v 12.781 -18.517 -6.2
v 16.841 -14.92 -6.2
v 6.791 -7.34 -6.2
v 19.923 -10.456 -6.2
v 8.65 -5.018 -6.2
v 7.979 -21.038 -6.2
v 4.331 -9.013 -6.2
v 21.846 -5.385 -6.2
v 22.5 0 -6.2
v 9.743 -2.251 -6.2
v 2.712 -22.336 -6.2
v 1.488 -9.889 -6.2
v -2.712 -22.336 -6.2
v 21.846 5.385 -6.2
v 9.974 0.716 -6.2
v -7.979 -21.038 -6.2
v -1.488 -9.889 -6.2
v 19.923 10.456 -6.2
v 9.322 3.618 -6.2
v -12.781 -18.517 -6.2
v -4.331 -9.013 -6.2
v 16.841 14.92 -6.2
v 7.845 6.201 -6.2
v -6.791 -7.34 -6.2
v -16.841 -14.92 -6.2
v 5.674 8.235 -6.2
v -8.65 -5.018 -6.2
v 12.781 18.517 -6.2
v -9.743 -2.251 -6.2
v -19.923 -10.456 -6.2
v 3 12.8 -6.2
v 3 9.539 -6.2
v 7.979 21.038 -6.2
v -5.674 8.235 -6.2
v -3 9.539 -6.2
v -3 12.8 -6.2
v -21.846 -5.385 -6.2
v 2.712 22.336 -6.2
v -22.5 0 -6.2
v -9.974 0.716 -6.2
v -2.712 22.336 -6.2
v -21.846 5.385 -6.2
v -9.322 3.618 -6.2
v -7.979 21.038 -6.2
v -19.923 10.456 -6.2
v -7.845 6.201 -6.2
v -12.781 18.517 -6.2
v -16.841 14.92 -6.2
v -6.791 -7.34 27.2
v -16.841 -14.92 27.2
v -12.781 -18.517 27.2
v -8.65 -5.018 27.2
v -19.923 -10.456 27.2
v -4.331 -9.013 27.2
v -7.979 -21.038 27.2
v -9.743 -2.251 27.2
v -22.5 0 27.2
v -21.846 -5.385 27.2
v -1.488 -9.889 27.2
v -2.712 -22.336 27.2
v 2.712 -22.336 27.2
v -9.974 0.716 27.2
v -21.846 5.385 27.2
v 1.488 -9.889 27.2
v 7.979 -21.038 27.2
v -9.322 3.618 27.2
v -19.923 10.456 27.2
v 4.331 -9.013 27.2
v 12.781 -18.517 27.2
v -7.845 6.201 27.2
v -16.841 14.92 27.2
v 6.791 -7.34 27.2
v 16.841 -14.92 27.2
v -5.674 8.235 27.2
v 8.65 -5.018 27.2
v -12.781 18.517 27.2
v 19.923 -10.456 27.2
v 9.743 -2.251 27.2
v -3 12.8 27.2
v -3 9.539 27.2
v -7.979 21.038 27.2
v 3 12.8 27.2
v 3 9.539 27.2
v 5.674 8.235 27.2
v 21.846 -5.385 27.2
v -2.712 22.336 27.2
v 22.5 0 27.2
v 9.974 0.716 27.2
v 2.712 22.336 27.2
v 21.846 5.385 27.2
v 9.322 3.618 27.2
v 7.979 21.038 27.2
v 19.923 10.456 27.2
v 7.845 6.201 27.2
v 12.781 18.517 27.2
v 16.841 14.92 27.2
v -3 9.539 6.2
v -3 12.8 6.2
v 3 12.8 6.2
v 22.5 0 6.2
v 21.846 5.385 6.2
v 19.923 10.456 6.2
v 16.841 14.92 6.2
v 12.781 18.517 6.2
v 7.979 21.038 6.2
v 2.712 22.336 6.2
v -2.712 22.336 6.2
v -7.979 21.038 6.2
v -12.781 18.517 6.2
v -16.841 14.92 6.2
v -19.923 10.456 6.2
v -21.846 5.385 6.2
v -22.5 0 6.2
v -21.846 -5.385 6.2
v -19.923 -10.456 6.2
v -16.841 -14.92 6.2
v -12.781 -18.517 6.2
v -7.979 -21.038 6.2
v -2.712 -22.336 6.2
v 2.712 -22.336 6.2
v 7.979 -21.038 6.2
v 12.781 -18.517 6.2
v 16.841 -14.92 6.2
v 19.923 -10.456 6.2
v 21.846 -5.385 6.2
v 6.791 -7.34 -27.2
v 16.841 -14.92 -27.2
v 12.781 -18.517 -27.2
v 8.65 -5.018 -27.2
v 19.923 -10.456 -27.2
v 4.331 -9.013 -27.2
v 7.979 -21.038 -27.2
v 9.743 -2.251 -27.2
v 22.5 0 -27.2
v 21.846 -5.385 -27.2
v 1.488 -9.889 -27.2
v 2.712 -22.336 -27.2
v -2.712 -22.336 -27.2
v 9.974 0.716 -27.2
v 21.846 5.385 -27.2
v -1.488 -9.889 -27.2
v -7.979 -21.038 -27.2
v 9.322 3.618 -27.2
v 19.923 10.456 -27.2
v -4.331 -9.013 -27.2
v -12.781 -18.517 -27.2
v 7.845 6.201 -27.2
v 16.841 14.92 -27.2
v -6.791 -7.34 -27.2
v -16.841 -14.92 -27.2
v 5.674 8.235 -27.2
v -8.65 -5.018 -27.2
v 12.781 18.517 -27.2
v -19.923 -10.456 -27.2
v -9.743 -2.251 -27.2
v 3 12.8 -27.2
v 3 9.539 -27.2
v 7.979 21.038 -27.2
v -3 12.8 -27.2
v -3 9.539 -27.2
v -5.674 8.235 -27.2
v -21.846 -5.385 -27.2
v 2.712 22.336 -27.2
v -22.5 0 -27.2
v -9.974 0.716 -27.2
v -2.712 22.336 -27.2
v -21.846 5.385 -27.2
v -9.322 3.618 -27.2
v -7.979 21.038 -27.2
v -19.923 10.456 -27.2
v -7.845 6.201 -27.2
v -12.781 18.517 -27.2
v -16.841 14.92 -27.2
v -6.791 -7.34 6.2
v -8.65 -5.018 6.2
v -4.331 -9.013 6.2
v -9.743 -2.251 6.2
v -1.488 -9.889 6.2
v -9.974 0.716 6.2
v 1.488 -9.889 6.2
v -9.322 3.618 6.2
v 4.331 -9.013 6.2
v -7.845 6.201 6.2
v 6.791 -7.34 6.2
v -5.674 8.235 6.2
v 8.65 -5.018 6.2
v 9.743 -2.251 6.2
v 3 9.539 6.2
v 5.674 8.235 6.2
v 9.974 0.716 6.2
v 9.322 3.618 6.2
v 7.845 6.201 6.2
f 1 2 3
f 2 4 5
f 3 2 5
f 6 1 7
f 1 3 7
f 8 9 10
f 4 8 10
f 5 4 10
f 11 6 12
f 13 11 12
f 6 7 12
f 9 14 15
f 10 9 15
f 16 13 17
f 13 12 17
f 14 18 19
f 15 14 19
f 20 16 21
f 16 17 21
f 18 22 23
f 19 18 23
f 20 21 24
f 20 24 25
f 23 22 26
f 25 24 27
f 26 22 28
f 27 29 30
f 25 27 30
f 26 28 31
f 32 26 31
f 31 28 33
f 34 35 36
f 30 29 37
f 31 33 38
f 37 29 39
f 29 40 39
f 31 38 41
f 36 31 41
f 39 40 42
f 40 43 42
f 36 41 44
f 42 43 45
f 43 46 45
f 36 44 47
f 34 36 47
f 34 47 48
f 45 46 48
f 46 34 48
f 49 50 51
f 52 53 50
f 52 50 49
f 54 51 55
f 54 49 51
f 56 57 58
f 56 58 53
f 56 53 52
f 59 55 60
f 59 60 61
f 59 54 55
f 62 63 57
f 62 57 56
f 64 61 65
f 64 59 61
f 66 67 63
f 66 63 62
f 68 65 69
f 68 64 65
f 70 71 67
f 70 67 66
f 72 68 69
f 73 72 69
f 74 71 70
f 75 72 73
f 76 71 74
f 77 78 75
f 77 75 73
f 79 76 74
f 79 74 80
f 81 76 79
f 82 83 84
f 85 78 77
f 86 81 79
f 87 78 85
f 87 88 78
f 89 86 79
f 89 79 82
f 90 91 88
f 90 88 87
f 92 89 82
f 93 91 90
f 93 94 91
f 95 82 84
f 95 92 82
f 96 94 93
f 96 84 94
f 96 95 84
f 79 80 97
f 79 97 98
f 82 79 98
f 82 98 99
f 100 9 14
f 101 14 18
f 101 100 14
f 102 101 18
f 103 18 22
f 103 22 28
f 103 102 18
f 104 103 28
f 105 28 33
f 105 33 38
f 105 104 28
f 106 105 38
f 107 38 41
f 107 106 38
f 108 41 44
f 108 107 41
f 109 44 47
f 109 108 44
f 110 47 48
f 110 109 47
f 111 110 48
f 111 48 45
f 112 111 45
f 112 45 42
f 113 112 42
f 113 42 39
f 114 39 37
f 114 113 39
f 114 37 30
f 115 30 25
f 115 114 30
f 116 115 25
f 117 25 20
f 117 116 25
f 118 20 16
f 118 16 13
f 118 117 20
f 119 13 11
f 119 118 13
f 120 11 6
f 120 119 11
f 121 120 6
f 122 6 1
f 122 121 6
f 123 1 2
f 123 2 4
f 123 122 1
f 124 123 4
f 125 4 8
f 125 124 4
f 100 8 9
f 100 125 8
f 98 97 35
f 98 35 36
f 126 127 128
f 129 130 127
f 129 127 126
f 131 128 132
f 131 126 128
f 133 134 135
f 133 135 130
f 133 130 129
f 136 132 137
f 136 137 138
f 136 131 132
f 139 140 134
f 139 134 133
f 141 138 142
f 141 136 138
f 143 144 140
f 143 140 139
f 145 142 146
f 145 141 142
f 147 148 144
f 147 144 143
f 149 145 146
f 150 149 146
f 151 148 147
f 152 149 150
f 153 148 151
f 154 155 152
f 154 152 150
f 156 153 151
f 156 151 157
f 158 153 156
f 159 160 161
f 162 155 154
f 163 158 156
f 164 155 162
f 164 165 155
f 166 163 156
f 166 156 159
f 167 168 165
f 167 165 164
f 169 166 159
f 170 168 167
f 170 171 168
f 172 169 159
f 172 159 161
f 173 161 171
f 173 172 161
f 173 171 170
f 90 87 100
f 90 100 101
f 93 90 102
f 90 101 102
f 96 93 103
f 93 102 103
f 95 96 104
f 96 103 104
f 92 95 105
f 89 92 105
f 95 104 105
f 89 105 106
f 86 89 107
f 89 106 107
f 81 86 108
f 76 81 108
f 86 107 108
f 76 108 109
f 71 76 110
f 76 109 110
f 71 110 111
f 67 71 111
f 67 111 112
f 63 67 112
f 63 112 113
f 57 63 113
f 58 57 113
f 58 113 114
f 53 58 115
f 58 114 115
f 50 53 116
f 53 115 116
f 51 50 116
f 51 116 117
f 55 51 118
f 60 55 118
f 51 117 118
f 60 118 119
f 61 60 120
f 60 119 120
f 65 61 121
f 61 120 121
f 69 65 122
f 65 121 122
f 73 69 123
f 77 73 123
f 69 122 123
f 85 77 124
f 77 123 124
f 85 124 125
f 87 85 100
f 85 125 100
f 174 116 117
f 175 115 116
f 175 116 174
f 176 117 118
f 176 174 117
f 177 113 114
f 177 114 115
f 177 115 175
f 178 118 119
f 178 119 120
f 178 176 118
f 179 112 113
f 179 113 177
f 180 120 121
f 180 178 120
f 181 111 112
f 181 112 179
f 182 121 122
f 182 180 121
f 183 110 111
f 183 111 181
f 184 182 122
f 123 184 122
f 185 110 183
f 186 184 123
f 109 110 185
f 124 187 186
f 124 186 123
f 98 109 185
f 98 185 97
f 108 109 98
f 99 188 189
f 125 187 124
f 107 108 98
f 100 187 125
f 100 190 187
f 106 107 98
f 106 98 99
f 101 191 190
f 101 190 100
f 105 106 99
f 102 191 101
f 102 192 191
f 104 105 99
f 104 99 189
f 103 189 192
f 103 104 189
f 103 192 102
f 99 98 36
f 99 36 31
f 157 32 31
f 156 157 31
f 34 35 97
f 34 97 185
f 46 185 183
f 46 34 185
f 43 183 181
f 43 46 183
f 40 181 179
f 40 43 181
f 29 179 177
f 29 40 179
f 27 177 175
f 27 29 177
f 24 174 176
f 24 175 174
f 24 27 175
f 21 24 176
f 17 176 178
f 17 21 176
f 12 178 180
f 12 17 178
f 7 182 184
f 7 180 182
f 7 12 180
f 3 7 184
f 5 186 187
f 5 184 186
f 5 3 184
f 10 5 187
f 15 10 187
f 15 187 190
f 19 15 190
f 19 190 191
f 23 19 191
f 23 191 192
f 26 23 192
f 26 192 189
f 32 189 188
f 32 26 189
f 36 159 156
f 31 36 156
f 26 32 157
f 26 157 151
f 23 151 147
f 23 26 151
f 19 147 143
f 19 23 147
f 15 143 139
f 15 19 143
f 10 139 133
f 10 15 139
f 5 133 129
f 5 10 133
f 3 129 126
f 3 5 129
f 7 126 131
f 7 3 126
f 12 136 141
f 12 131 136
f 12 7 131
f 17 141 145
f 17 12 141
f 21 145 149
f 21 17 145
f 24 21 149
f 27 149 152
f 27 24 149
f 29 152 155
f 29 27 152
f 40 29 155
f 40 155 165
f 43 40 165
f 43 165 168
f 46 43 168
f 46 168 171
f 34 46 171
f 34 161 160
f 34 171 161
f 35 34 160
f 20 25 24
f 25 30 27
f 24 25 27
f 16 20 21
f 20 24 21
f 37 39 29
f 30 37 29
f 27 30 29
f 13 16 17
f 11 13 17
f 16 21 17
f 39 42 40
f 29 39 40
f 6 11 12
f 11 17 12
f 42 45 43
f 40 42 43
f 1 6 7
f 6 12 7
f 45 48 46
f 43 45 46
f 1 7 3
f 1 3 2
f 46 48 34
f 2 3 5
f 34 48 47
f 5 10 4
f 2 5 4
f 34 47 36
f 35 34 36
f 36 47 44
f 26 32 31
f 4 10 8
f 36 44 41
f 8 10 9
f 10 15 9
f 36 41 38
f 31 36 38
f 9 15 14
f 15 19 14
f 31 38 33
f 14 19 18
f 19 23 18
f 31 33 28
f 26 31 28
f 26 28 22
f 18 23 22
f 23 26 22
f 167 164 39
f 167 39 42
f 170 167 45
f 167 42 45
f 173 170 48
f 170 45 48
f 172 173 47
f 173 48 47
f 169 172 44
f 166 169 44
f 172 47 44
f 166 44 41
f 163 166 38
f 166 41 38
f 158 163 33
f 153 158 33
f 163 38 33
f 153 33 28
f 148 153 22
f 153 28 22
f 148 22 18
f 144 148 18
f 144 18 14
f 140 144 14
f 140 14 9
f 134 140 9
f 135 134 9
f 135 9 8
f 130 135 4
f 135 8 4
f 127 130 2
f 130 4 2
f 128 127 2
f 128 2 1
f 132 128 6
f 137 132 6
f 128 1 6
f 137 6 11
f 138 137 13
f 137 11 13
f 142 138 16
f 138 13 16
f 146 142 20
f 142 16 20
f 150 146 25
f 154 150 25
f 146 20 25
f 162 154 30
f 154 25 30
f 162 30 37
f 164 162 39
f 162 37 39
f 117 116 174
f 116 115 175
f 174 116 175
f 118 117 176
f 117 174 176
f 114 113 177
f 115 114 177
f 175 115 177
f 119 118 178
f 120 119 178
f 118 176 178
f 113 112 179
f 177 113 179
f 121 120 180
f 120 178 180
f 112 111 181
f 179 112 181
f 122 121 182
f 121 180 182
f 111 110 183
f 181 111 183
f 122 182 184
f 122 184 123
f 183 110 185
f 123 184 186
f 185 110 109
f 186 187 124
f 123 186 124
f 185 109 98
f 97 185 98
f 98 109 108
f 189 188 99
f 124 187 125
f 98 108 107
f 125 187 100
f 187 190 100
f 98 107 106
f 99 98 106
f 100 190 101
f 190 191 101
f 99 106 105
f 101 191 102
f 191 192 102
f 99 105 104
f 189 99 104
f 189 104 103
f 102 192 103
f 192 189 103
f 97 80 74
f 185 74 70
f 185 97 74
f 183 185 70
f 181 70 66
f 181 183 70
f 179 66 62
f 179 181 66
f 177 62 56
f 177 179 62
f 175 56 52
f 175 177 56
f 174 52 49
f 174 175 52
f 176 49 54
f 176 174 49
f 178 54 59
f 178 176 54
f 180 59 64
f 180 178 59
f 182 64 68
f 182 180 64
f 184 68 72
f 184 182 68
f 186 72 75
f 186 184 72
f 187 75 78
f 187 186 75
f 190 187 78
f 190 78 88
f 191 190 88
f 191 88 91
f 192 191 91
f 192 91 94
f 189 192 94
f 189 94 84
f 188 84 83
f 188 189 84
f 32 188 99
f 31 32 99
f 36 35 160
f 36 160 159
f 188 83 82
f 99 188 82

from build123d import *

# Parameters (mm, degrees)
SKETCH_1_R          = 22.5
SKETCH_1_R_2        = 10
EXTRUDE_1_DEPTH     = 6.2
SKETCH_3_R          = 22.5
SKETCH_3_R_2        = 10
EXTRUDE_2_DEPTH     = 21
SKETCH_4_R          = 22.5
SKETCH_4_R_2        = 10
EXTRUDE_3_DEPTH     = 21
SKETCH_6_W          = 6
SKETCH_6_H          = 5.6
CUT_EXTRUDE_1_DEPTH = 55.4


with BuildPart() as part:
    # 草图1 → 凸台-拉伸1 (new body, symmetric)
    with BuildSketch(Plane.XY):
        Circle(SKETCH_1_R)
        Circle(SKETCH_1_R_2, mode=Mode.SUBTRACT)
    extrude(amount=EXTRUDE_1_DEPTH, both=True)


with BuildPart() as body_2:
    # 草图3 → 凸台-拉伸2 (new body)
    with BuildSketch(Plane.XY.offset(6.2)):
        Circle(SKETCH_3_R)
        Circle(SKETCH_3_R_2, mode=Mode.SUBTRACT)
    extrude(amount=EXTRUDE_2_DEPTH)


with BuildPart() as body_3:
    # 草图4 → 凸台-拉伸3 (new body)
    with BuildSketch(Plane(origin=(0, 0, -6.2), x_dir=(-1, 0, 0), z_dir=(0, 0, -1))):
        Circle(SKETCH_4_R)
        Circle(SKETCH_4_R_2, mode=Mode.SUBTRACT)
    extrude(amount=EXTRUDE_3_DEPTH)


with BuildPart() as cut_extrude_1_tool:
    # 草图6 → 切除-拉伸1 (new body, through all)
    with BuildSketch(Plane.XY.offset(27.2)):
        with Locations((0, 10)):
            Rectangle(SKETCH_6_W, SKETCH_6_H)
    extrude(amount=-CUT_EXTRUDE_1_DEPTH)


with BuildPart() as part_1:
    add(part.part)

    # 切除-拉伸1: cut by cut_extrude_1_tool
    add(cut_extrude_1_tool.part, mode=Mode.SUBTRACT)


with BuildPart() as body_2_1:
    add(body_2.part)

    # 切除-拉伸1: cut by cut_extrude_1_tool
    add(cut_extrude_1_tool.part, mode=Mode.SUBTRACT)


with BuildPart() as body_3_1:
    add(body_3.part)

    # 切除-拉伸1: cut by cut_extrude_1_tool
    add(cut_extrude_1_tool.part, mode=Mode.SUBTRACT)


solid = Compound([part_1.part, body_2_1.part, body_3_1.part])
